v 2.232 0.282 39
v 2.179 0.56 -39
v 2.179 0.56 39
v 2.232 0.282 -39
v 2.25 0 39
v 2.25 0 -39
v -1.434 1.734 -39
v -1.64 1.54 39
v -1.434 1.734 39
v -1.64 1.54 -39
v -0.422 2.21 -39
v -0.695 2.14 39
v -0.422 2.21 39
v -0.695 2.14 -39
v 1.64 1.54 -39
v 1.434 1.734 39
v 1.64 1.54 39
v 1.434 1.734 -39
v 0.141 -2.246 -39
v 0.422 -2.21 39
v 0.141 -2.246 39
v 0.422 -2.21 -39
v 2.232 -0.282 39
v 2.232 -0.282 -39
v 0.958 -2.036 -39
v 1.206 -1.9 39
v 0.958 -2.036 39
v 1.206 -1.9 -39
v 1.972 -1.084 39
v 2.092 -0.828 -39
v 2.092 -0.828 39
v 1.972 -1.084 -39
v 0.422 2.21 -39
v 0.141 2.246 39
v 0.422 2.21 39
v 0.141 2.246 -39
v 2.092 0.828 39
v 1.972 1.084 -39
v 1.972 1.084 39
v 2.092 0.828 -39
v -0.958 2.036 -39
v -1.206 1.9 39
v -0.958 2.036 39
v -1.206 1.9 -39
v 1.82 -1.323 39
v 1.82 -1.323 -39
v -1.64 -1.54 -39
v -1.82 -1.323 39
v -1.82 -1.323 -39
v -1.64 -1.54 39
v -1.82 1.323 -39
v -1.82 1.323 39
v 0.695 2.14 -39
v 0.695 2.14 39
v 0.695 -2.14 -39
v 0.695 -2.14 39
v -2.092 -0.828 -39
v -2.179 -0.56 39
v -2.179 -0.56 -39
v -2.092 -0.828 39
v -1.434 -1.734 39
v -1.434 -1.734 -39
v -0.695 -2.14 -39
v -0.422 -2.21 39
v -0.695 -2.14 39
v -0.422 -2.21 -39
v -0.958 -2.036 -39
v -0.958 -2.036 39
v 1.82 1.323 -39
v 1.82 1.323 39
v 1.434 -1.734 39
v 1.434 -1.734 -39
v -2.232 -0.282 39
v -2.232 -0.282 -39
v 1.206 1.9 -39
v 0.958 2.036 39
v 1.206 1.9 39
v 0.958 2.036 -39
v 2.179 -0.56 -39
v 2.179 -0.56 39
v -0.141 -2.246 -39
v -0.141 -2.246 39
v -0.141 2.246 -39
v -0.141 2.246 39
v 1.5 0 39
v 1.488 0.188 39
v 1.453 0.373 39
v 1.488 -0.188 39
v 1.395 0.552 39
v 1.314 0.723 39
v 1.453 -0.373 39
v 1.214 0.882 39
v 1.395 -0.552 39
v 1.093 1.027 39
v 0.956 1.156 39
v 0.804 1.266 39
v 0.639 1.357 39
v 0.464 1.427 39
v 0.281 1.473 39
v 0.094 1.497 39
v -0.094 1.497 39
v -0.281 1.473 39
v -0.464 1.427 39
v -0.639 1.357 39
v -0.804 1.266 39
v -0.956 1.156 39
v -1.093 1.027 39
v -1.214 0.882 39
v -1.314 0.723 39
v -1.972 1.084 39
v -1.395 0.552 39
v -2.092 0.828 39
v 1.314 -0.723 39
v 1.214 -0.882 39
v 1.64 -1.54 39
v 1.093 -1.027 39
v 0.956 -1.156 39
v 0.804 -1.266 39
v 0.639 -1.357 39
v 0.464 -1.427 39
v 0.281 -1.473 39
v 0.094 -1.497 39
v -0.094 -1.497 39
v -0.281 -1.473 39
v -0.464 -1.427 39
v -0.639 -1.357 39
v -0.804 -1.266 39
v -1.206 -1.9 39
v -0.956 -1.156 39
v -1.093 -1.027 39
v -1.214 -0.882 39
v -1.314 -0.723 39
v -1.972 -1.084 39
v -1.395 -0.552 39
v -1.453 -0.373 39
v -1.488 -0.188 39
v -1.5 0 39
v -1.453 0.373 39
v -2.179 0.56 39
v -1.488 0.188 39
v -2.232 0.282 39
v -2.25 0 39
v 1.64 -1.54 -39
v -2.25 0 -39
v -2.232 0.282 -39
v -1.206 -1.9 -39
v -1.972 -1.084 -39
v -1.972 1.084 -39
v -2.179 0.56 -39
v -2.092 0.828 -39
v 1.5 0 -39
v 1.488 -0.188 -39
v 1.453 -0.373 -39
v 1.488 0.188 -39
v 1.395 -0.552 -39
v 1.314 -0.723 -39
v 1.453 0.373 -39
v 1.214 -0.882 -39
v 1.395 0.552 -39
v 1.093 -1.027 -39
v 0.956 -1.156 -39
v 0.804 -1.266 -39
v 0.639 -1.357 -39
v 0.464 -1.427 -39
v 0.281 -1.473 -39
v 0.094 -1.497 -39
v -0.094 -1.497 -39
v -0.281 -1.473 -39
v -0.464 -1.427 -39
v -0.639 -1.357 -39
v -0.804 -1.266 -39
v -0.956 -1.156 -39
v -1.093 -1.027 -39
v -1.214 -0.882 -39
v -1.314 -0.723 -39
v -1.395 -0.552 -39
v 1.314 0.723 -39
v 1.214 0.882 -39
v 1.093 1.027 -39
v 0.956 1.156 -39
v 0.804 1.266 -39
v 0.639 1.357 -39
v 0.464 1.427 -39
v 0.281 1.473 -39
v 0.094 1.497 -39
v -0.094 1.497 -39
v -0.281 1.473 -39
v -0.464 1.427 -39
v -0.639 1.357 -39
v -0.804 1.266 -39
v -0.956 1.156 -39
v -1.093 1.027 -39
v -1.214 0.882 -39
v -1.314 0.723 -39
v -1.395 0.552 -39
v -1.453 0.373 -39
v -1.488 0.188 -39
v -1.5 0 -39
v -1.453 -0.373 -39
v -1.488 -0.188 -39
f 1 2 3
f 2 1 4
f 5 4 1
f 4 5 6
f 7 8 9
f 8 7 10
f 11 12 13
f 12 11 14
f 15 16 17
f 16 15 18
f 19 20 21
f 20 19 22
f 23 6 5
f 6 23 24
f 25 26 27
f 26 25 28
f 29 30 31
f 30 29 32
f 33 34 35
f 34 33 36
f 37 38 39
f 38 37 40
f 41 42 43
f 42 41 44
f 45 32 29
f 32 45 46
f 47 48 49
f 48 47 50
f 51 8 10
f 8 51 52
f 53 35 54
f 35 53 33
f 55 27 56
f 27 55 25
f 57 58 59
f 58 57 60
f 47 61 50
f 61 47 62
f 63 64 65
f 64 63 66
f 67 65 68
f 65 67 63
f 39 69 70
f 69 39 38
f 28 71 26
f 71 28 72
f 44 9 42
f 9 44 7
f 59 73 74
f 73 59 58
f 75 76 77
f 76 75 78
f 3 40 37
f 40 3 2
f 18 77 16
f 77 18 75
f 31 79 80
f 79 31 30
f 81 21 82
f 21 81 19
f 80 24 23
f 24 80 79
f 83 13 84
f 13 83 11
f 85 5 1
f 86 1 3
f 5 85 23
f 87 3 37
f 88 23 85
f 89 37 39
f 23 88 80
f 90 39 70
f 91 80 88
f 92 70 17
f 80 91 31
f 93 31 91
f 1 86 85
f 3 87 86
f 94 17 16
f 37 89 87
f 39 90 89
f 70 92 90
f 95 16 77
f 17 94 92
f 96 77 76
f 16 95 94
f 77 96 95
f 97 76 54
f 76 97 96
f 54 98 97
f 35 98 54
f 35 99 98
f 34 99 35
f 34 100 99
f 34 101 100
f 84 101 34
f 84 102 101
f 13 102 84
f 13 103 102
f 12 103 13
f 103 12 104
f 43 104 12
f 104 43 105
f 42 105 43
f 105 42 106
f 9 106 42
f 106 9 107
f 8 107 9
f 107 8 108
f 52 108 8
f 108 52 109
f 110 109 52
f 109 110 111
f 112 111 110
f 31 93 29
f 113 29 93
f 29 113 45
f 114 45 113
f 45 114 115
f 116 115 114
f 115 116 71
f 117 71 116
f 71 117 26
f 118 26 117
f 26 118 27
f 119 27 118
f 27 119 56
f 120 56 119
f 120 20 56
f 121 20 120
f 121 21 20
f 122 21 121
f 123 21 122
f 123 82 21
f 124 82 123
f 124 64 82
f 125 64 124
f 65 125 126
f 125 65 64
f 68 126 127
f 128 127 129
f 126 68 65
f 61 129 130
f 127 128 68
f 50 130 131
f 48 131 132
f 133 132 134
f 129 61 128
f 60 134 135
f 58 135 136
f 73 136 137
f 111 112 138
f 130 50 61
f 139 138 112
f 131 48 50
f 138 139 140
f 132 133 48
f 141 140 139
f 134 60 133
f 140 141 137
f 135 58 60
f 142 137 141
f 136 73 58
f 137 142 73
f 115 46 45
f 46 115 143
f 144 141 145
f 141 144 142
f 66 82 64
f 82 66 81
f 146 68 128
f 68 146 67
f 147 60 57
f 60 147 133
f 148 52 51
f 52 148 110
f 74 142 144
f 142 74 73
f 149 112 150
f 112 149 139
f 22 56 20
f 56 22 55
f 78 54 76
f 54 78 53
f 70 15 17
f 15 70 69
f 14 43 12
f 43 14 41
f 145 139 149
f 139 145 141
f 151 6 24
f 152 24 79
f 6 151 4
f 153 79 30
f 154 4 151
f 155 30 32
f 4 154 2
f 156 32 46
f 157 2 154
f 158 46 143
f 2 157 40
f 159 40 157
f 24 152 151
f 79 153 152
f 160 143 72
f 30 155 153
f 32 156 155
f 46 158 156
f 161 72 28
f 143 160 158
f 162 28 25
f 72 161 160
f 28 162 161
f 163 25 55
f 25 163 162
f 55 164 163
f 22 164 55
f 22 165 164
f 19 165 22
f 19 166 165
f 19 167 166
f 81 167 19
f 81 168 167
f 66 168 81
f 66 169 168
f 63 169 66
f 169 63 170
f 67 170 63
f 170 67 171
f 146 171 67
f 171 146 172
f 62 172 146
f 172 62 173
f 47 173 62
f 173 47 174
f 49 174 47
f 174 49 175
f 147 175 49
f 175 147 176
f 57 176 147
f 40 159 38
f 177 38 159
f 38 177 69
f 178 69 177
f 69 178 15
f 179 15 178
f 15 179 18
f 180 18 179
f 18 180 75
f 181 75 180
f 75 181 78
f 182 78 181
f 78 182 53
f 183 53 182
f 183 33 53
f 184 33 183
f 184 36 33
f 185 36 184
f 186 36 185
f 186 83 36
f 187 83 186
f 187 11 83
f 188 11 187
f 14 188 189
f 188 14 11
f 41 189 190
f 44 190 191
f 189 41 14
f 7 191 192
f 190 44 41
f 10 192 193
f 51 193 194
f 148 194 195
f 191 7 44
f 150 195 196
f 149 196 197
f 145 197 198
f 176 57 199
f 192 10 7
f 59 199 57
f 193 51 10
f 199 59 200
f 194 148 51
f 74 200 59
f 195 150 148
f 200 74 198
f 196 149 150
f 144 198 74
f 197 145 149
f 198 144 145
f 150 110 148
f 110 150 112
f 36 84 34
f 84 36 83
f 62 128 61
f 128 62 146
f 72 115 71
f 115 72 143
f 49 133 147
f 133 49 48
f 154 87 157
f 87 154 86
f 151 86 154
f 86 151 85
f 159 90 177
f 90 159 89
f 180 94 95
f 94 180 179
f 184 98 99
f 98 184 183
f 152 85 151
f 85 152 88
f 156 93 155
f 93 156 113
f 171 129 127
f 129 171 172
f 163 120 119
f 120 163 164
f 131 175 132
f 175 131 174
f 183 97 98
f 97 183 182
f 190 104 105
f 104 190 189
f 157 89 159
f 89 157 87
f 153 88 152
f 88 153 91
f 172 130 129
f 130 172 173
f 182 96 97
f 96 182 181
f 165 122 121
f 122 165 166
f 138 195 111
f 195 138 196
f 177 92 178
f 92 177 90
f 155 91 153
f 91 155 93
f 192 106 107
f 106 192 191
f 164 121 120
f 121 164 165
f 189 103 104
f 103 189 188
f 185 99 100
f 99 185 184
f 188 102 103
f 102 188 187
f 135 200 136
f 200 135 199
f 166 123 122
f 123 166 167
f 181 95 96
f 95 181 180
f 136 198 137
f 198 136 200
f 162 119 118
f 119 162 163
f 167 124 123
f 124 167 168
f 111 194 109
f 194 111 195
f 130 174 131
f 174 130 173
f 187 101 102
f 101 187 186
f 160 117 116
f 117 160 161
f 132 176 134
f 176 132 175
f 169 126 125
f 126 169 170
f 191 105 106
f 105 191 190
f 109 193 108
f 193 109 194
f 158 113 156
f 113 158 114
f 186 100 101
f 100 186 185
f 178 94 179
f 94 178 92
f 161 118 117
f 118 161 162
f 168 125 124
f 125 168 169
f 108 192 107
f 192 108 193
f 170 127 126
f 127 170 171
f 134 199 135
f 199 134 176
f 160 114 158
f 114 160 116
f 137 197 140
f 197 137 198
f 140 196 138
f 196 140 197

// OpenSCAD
$fn = 50;


difference() {
	union() {
		translate(v = [0, 0, -39.0000000000]) {
			cylinder(h = 78, r = 2.2500000000);
		}
	}
	union() {
		translate(v = [0, 0, -100.0000000000]) {
			cylinder(h = 200, r = 1.5000000000);
		}
	}
}
